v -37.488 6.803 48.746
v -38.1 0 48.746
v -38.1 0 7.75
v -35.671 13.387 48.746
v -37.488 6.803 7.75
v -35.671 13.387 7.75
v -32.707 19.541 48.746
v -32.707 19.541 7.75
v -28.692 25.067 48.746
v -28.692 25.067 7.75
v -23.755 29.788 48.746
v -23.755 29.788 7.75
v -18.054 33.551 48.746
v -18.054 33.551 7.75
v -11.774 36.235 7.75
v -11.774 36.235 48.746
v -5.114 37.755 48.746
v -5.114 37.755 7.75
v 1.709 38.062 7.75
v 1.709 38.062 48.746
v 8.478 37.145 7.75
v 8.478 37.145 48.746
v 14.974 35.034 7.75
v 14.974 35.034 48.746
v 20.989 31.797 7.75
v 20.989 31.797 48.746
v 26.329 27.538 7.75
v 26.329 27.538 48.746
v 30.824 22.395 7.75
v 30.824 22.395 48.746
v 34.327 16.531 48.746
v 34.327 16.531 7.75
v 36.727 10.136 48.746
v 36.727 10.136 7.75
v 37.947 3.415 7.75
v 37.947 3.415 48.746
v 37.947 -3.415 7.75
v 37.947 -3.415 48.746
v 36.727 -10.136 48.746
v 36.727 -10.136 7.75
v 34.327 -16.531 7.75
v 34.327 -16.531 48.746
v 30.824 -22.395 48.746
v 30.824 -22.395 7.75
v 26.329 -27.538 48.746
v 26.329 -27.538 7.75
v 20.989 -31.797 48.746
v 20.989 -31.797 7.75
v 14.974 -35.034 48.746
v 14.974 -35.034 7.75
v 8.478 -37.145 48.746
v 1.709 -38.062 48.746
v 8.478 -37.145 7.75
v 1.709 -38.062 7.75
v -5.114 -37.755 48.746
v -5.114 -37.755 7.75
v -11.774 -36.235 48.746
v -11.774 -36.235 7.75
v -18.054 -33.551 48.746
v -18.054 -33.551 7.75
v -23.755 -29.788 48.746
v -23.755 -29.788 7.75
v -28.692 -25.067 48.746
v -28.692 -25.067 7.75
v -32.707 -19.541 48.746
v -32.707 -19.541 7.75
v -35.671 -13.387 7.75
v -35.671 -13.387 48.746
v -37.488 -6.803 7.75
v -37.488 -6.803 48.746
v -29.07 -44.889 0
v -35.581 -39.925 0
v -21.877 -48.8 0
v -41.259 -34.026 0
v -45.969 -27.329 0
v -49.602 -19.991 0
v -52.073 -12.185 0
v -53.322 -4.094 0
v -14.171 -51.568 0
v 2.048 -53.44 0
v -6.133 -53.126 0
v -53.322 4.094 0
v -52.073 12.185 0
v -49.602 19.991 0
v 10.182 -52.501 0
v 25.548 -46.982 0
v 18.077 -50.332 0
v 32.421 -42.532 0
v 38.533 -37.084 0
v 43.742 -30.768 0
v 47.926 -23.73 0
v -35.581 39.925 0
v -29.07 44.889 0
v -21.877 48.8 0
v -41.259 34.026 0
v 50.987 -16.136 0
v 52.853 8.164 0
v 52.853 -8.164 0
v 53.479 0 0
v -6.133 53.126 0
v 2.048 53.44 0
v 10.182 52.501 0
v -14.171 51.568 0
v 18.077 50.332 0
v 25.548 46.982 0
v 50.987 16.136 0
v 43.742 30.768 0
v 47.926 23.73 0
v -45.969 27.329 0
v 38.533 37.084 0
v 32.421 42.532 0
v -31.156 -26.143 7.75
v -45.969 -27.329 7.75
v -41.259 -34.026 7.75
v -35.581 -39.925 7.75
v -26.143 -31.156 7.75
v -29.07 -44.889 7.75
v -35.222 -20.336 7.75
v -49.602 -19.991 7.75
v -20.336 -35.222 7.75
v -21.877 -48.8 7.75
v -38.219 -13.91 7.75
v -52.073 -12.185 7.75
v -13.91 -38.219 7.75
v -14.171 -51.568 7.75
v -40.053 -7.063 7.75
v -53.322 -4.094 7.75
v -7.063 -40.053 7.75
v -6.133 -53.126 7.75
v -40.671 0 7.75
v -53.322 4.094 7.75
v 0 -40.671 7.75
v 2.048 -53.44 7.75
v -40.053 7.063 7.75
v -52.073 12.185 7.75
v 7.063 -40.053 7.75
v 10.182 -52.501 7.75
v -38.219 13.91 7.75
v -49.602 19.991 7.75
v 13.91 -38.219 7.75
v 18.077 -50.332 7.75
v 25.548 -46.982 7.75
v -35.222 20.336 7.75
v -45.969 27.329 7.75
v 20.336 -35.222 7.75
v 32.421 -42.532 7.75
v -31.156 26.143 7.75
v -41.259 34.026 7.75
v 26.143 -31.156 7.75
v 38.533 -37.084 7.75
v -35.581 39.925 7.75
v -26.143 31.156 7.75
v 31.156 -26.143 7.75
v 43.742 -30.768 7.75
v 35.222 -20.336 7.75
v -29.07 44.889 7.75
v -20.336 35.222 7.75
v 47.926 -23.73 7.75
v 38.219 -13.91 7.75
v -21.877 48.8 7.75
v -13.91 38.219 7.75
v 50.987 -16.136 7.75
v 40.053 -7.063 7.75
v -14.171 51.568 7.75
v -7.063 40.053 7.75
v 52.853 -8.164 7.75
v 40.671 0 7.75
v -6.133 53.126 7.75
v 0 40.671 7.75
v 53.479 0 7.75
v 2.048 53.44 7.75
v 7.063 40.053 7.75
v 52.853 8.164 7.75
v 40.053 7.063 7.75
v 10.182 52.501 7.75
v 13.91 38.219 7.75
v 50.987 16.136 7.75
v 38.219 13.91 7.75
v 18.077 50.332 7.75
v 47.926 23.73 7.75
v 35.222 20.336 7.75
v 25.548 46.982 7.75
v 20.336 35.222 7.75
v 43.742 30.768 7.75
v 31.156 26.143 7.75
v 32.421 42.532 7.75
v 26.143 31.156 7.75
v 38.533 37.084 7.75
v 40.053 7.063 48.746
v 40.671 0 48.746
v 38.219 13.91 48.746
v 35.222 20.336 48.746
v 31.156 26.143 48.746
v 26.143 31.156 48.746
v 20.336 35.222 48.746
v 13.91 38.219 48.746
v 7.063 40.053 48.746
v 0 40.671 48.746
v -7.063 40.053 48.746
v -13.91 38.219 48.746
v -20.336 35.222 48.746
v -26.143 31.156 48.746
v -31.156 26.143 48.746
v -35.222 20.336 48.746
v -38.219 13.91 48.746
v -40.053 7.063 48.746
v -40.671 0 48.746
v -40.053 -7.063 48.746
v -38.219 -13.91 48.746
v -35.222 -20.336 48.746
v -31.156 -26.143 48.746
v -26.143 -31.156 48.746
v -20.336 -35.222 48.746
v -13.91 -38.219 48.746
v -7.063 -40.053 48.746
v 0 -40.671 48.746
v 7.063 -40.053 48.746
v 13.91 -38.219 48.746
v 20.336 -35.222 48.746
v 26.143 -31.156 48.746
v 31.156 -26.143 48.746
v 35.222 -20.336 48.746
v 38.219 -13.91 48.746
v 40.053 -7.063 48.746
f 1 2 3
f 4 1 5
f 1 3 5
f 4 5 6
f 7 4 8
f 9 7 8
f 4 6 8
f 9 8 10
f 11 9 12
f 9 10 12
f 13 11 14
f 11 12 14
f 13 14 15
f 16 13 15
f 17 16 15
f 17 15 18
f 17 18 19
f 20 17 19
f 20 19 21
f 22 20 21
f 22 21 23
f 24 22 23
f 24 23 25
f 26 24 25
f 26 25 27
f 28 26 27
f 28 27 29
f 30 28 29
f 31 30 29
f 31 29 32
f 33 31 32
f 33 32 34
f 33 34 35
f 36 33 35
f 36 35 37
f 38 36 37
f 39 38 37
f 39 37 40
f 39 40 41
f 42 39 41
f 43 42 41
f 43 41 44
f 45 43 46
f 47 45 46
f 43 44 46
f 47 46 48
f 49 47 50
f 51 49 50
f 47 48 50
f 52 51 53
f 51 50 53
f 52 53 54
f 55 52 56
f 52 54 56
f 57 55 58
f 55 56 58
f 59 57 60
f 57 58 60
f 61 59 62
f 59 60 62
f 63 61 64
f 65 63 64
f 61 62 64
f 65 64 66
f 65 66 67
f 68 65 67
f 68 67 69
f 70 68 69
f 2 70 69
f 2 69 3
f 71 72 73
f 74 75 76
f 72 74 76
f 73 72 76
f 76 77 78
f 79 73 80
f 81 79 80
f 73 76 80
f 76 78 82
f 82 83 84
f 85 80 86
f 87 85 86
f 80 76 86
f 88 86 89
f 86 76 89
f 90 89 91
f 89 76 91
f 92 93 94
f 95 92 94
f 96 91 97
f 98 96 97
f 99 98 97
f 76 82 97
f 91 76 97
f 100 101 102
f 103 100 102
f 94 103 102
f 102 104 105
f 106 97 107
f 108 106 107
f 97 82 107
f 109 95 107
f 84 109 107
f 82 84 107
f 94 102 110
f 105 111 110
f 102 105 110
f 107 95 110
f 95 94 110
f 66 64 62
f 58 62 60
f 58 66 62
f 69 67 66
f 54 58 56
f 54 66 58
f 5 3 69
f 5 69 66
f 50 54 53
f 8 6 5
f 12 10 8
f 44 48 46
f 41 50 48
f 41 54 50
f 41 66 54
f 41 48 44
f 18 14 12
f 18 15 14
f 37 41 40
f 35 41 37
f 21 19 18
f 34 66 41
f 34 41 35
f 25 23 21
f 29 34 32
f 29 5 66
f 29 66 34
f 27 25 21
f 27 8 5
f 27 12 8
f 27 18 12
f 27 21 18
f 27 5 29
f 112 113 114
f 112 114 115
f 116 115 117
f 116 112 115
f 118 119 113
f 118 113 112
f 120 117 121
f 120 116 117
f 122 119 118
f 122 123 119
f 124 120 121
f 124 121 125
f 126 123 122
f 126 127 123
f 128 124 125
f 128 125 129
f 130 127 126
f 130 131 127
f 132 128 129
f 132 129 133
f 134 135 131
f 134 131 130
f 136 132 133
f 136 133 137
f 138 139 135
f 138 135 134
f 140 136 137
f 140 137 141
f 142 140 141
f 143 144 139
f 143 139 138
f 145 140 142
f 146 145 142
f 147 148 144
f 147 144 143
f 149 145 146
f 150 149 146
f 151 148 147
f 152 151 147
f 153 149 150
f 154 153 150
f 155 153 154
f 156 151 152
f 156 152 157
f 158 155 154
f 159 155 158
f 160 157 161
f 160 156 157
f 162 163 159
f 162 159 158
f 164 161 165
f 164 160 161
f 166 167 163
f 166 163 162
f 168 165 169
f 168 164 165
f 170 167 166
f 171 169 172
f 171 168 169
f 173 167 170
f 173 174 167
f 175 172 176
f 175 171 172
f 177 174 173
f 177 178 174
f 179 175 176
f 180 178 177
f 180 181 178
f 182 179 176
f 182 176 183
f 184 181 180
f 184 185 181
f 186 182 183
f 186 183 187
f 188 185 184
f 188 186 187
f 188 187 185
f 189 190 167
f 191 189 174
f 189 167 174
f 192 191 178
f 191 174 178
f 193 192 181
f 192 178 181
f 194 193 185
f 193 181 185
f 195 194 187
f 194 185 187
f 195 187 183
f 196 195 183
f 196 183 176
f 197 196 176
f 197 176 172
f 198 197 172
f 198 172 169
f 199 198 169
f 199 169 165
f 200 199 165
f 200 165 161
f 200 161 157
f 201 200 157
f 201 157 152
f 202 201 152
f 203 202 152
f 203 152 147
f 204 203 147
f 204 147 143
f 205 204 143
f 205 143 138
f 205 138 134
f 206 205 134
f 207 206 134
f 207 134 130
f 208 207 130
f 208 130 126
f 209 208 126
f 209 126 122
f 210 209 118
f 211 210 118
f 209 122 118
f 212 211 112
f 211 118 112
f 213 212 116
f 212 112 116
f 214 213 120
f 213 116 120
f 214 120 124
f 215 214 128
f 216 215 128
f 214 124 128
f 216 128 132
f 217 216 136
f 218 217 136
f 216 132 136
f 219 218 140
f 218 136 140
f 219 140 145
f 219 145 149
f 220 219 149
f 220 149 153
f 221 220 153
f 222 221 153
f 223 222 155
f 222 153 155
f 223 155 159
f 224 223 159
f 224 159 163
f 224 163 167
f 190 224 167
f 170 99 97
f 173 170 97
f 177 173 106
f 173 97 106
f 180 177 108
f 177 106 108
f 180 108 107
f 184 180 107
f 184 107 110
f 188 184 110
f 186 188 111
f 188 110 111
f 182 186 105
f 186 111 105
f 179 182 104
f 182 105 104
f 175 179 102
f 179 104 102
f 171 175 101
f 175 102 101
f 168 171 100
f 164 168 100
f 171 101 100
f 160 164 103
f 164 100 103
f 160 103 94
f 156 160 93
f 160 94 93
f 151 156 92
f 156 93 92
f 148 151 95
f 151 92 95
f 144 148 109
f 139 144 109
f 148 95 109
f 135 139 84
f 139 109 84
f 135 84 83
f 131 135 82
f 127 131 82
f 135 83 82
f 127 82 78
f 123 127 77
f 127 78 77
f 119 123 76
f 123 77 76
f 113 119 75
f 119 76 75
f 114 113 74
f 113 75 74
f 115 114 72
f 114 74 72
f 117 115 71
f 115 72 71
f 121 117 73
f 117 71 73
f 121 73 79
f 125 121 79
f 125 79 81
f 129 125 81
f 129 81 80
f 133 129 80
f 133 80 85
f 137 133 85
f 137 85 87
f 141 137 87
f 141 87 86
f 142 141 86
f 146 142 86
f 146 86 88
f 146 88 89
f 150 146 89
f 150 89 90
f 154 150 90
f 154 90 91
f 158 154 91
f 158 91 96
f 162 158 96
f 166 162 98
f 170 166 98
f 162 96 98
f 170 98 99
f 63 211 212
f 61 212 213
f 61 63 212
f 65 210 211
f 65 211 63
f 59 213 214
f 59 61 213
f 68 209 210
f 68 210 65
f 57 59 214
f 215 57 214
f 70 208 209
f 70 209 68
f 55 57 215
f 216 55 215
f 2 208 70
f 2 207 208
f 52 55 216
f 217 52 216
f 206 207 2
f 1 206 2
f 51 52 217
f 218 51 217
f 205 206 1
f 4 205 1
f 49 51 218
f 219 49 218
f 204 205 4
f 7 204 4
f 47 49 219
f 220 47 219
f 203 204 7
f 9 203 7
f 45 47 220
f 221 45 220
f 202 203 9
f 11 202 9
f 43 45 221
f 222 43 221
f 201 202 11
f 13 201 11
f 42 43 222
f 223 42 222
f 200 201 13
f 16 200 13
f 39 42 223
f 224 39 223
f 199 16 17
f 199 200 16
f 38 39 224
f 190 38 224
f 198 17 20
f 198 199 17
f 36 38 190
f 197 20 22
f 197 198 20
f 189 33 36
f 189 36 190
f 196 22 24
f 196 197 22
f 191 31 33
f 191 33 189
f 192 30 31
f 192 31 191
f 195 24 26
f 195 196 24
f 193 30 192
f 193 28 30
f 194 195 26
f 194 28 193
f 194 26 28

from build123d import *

# Parameters (mm, degrees)
F0_R     = 40.671356
F1_DEPTH = 48.746474
F3_D     = 76.2
F4_R     = 53.479335
F5_DEPTH = 7.750219


with BuildPart() as f1:
    # F0 (on Top) → F1 (new body)
    with BuildSketch(Plane.XY):
        Circle(F0_R)
    extrude(amount=F1_DEPTH)

    # F3 (through all)
    with Locations(Plane.XY.offset(48.746474)):
        with Locations((0, 0)):
            Hole(F3_D / 2)

    # F4 (on Top) → F5 (join)
    with BuildSketch(Plane.XY):
        Circle(F4_R)
    extrude(amount=F5_DEPTH)


solid = f1.part
